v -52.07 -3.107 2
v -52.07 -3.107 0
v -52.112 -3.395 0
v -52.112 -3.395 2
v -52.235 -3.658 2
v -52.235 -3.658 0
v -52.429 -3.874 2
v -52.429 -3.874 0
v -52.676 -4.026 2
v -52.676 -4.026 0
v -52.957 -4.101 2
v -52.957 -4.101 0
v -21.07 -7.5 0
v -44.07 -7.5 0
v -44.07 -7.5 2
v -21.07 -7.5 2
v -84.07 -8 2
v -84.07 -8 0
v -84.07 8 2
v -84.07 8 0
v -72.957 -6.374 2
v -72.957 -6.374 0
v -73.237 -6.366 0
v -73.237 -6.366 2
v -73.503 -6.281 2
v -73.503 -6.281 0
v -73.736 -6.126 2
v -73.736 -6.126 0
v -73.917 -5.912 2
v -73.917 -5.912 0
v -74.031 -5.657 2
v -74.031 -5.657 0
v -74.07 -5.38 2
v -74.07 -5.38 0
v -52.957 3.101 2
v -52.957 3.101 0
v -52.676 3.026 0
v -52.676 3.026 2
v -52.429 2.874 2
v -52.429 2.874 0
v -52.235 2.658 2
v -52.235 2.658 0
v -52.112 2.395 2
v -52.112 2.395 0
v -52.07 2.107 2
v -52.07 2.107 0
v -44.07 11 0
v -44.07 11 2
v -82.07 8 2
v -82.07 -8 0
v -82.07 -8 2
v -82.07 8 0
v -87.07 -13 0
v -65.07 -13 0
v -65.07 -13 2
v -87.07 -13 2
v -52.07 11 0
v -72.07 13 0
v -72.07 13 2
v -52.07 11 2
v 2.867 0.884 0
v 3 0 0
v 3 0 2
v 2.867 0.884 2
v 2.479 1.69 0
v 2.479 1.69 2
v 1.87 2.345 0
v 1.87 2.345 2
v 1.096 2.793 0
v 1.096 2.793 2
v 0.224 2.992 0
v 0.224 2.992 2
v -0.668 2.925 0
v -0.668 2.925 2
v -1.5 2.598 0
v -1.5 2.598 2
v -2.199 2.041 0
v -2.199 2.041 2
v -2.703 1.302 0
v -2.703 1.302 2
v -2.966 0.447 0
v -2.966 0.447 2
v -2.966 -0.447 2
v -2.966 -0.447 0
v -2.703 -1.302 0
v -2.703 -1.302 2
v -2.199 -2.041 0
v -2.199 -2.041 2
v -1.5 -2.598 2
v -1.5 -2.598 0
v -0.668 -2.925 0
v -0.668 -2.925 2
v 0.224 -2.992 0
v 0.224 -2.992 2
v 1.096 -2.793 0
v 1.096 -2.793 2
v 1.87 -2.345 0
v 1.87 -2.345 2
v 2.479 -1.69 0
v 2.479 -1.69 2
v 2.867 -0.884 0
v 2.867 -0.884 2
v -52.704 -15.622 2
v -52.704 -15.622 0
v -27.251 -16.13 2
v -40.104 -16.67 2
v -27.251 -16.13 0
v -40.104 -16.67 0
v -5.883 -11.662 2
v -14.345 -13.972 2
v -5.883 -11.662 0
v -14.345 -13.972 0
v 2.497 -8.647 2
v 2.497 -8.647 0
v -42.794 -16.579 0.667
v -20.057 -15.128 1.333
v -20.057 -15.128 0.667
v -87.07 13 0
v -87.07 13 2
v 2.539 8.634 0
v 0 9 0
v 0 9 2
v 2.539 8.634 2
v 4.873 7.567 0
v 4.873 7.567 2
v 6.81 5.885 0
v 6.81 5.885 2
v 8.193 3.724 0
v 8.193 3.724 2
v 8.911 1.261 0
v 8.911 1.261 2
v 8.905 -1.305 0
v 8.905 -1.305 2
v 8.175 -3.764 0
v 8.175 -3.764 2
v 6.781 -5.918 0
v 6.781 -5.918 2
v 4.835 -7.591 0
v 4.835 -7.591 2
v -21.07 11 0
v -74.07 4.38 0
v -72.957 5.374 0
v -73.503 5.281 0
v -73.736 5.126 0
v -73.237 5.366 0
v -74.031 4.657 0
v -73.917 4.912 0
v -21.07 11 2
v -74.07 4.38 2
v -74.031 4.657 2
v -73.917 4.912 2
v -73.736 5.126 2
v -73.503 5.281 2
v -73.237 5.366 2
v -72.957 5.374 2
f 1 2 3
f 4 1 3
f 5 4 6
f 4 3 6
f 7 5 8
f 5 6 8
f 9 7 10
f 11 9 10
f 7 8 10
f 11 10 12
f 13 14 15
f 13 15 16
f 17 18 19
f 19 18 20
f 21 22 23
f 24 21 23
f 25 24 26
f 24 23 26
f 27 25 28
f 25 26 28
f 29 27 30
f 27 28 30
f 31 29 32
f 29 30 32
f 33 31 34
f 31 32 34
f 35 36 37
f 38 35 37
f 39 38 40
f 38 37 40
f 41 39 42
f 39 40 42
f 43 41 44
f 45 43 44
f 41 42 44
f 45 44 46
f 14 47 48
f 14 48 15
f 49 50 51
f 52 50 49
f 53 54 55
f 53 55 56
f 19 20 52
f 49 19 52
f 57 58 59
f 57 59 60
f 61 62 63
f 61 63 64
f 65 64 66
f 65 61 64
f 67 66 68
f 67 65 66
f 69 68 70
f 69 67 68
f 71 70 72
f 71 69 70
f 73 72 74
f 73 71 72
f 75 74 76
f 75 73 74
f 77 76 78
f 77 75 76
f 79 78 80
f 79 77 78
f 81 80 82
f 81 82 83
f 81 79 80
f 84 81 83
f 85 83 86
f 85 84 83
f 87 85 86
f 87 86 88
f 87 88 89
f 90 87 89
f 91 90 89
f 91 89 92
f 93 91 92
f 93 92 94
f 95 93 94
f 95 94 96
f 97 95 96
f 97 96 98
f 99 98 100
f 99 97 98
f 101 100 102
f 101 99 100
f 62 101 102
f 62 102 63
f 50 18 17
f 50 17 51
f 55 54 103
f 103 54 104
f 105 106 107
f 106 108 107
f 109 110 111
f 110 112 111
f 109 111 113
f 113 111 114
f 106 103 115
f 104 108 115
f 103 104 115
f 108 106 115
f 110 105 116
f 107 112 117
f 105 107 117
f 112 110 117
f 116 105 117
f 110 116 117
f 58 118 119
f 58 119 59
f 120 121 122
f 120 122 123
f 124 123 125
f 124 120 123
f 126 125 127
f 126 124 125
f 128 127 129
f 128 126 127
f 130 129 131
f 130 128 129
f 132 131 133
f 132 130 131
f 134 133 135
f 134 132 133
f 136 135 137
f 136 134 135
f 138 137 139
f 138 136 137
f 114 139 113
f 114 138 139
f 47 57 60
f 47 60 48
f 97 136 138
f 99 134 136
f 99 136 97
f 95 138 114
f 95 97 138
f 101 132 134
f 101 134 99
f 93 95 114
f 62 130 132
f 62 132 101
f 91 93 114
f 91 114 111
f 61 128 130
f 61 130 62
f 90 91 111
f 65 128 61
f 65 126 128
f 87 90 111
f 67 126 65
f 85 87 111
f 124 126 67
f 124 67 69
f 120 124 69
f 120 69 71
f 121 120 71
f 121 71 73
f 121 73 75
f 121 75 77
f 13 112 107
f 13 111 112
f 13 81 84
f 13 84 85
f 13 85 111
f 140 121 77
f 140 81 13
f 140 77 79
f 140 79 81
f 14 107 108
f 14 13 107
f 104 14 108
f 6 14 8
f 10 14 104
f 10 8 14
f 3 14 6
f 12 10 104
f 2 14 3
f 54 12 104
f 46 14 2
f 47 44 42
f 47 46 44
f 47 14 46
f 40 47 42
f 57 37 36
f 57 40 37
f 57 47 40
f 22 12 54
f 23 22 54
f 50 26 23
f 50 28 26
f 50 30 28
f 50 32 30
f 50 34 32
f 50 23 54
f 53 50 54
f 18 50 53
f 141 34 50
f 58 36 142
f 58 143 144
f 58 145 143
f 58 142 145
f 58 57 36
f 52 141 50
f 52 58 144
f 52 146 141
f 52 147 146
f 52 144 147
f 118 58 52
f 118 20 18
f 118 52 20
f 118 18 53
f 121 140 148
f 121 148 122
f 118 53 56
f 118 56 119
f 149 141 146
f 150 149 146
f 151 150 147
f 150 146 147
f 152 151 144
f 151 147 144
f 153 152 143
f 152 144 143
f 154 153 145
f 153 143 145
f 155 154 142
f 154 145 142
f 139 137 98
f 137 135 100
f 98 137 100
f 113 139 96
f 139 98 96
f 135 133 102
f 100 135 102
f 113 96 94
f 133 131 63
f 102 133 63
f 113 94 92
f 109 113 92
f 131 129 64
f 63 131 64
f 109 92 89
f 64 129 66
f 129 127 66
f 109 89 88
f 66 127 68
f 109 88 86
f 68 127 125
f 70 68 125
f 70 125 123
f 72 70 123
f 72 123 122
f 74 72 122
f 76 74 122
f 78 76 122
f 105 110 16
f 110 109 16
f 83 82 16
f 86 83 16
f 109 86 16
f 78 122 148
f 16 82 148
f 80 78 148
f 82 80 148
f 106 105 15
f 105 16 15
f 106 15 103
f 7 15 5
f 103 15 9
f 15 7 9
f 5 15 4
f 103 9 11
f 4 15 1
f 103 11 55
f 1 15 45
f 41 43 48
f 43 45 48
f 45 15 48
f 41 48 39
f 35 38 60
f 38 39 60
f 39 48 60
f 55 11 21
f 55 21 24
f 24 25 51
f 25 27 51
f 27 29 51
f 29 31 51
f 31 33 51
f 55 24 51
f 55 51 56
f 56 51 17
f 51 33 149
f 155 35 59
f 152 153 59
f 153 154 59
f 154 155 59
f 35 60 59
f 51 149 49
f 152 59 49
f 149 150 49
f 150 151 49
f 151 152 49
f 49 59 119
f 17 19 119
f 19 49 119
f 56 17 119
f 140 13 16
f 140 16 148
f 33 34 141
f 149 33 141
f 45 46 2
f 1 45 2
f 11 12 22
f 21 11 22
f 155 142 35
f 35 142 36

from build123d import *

# Parameters (mm, degrees)
ESBO_O1_R                = 3
ESBO_O1_W                = 2
ESBO_O1_H                = 16
RESSALTO_EXTRUS_O1_DEPTH = 2


with BuildPart() as part:
    # Esboço1 → Ressalto-extrusão1 (new body)
    with BuildSketch(Plane.XY):
        with BuildLine():
            Line((-21.07, 11), (0, 9))
            ThreePointArc((0, 9), (8.911247748, 1.260818614), (2.496770452, -8.646741427))
            add(Edge.make_bspline(
                [(-65.07, -13), (-43.239788601, -19.093527225), (-19.750123263, -17.642441034), (2.496770452, -8.646741427)],
                knots=[0, 0, 0, 0, 0.972962774, 0.972962774, 0.972962774, 0.972962774], degree=3))
            Line((-65.07, -13), (-87.07, -13))
            Line((-87.07, -13), (-87.07, 13))
            Line((-87.07, 13), (-72.07, 13))
            Line((-72.07, 13), (-52.07, 11))
            Line((-52.07, 11), (-44.07, 11))
            Line((-44.07, 11), (-44.07, -7.5))
            Line((-44.07, -7.5), (-21.07, -7.5))
            Line((-21.07, -7.5), (-21.07, 11))
        make_face()
        Circle(ESBO_O1_R, mode=Mode.SUBTRACT)
        with BuildLine():
            Line((-52.07, 2.107200462), (-52.07, -3.107200462))
            ThreePointArc((-52.07, -3.107200462), (-52.32404099, -3.773192321), (-52.957090312, -4.100805717))
            Line((-52.957090312, -4.100805717), (-72.957090312, -6.37353299))
            ThreePointArc((-72.957090312, -6.37353299), (-73.735991859, -6.125886745), (-74.07, -5.379927735))
            Line((-74.07, -5.379927735), (-74.07, 4.379927735))
            ThreePointArc((-74.07, 4.379927735), (-73.735991859, 5.125886745), (-72.957090312, 5.37353299))
            Line((-72.957090312, 5.37353299), (-52.957090312, 3.100805717))
            ThreePointArc((-52.957090312, 3.100805717), (-52.32404099, 2.773192321), (-52.07, 2.107200462))
        make_face(mode=Mode.SUBTRACT)
        with Locations((-83.07, 0)):
            Rectangle(ESBO_O1_W, ESBO_O1_H, mode=Mode.SUBTRACT)
    extrude(amount=RESSALTO_EXTRUS_O1_DEPTH)


solid = part.part
